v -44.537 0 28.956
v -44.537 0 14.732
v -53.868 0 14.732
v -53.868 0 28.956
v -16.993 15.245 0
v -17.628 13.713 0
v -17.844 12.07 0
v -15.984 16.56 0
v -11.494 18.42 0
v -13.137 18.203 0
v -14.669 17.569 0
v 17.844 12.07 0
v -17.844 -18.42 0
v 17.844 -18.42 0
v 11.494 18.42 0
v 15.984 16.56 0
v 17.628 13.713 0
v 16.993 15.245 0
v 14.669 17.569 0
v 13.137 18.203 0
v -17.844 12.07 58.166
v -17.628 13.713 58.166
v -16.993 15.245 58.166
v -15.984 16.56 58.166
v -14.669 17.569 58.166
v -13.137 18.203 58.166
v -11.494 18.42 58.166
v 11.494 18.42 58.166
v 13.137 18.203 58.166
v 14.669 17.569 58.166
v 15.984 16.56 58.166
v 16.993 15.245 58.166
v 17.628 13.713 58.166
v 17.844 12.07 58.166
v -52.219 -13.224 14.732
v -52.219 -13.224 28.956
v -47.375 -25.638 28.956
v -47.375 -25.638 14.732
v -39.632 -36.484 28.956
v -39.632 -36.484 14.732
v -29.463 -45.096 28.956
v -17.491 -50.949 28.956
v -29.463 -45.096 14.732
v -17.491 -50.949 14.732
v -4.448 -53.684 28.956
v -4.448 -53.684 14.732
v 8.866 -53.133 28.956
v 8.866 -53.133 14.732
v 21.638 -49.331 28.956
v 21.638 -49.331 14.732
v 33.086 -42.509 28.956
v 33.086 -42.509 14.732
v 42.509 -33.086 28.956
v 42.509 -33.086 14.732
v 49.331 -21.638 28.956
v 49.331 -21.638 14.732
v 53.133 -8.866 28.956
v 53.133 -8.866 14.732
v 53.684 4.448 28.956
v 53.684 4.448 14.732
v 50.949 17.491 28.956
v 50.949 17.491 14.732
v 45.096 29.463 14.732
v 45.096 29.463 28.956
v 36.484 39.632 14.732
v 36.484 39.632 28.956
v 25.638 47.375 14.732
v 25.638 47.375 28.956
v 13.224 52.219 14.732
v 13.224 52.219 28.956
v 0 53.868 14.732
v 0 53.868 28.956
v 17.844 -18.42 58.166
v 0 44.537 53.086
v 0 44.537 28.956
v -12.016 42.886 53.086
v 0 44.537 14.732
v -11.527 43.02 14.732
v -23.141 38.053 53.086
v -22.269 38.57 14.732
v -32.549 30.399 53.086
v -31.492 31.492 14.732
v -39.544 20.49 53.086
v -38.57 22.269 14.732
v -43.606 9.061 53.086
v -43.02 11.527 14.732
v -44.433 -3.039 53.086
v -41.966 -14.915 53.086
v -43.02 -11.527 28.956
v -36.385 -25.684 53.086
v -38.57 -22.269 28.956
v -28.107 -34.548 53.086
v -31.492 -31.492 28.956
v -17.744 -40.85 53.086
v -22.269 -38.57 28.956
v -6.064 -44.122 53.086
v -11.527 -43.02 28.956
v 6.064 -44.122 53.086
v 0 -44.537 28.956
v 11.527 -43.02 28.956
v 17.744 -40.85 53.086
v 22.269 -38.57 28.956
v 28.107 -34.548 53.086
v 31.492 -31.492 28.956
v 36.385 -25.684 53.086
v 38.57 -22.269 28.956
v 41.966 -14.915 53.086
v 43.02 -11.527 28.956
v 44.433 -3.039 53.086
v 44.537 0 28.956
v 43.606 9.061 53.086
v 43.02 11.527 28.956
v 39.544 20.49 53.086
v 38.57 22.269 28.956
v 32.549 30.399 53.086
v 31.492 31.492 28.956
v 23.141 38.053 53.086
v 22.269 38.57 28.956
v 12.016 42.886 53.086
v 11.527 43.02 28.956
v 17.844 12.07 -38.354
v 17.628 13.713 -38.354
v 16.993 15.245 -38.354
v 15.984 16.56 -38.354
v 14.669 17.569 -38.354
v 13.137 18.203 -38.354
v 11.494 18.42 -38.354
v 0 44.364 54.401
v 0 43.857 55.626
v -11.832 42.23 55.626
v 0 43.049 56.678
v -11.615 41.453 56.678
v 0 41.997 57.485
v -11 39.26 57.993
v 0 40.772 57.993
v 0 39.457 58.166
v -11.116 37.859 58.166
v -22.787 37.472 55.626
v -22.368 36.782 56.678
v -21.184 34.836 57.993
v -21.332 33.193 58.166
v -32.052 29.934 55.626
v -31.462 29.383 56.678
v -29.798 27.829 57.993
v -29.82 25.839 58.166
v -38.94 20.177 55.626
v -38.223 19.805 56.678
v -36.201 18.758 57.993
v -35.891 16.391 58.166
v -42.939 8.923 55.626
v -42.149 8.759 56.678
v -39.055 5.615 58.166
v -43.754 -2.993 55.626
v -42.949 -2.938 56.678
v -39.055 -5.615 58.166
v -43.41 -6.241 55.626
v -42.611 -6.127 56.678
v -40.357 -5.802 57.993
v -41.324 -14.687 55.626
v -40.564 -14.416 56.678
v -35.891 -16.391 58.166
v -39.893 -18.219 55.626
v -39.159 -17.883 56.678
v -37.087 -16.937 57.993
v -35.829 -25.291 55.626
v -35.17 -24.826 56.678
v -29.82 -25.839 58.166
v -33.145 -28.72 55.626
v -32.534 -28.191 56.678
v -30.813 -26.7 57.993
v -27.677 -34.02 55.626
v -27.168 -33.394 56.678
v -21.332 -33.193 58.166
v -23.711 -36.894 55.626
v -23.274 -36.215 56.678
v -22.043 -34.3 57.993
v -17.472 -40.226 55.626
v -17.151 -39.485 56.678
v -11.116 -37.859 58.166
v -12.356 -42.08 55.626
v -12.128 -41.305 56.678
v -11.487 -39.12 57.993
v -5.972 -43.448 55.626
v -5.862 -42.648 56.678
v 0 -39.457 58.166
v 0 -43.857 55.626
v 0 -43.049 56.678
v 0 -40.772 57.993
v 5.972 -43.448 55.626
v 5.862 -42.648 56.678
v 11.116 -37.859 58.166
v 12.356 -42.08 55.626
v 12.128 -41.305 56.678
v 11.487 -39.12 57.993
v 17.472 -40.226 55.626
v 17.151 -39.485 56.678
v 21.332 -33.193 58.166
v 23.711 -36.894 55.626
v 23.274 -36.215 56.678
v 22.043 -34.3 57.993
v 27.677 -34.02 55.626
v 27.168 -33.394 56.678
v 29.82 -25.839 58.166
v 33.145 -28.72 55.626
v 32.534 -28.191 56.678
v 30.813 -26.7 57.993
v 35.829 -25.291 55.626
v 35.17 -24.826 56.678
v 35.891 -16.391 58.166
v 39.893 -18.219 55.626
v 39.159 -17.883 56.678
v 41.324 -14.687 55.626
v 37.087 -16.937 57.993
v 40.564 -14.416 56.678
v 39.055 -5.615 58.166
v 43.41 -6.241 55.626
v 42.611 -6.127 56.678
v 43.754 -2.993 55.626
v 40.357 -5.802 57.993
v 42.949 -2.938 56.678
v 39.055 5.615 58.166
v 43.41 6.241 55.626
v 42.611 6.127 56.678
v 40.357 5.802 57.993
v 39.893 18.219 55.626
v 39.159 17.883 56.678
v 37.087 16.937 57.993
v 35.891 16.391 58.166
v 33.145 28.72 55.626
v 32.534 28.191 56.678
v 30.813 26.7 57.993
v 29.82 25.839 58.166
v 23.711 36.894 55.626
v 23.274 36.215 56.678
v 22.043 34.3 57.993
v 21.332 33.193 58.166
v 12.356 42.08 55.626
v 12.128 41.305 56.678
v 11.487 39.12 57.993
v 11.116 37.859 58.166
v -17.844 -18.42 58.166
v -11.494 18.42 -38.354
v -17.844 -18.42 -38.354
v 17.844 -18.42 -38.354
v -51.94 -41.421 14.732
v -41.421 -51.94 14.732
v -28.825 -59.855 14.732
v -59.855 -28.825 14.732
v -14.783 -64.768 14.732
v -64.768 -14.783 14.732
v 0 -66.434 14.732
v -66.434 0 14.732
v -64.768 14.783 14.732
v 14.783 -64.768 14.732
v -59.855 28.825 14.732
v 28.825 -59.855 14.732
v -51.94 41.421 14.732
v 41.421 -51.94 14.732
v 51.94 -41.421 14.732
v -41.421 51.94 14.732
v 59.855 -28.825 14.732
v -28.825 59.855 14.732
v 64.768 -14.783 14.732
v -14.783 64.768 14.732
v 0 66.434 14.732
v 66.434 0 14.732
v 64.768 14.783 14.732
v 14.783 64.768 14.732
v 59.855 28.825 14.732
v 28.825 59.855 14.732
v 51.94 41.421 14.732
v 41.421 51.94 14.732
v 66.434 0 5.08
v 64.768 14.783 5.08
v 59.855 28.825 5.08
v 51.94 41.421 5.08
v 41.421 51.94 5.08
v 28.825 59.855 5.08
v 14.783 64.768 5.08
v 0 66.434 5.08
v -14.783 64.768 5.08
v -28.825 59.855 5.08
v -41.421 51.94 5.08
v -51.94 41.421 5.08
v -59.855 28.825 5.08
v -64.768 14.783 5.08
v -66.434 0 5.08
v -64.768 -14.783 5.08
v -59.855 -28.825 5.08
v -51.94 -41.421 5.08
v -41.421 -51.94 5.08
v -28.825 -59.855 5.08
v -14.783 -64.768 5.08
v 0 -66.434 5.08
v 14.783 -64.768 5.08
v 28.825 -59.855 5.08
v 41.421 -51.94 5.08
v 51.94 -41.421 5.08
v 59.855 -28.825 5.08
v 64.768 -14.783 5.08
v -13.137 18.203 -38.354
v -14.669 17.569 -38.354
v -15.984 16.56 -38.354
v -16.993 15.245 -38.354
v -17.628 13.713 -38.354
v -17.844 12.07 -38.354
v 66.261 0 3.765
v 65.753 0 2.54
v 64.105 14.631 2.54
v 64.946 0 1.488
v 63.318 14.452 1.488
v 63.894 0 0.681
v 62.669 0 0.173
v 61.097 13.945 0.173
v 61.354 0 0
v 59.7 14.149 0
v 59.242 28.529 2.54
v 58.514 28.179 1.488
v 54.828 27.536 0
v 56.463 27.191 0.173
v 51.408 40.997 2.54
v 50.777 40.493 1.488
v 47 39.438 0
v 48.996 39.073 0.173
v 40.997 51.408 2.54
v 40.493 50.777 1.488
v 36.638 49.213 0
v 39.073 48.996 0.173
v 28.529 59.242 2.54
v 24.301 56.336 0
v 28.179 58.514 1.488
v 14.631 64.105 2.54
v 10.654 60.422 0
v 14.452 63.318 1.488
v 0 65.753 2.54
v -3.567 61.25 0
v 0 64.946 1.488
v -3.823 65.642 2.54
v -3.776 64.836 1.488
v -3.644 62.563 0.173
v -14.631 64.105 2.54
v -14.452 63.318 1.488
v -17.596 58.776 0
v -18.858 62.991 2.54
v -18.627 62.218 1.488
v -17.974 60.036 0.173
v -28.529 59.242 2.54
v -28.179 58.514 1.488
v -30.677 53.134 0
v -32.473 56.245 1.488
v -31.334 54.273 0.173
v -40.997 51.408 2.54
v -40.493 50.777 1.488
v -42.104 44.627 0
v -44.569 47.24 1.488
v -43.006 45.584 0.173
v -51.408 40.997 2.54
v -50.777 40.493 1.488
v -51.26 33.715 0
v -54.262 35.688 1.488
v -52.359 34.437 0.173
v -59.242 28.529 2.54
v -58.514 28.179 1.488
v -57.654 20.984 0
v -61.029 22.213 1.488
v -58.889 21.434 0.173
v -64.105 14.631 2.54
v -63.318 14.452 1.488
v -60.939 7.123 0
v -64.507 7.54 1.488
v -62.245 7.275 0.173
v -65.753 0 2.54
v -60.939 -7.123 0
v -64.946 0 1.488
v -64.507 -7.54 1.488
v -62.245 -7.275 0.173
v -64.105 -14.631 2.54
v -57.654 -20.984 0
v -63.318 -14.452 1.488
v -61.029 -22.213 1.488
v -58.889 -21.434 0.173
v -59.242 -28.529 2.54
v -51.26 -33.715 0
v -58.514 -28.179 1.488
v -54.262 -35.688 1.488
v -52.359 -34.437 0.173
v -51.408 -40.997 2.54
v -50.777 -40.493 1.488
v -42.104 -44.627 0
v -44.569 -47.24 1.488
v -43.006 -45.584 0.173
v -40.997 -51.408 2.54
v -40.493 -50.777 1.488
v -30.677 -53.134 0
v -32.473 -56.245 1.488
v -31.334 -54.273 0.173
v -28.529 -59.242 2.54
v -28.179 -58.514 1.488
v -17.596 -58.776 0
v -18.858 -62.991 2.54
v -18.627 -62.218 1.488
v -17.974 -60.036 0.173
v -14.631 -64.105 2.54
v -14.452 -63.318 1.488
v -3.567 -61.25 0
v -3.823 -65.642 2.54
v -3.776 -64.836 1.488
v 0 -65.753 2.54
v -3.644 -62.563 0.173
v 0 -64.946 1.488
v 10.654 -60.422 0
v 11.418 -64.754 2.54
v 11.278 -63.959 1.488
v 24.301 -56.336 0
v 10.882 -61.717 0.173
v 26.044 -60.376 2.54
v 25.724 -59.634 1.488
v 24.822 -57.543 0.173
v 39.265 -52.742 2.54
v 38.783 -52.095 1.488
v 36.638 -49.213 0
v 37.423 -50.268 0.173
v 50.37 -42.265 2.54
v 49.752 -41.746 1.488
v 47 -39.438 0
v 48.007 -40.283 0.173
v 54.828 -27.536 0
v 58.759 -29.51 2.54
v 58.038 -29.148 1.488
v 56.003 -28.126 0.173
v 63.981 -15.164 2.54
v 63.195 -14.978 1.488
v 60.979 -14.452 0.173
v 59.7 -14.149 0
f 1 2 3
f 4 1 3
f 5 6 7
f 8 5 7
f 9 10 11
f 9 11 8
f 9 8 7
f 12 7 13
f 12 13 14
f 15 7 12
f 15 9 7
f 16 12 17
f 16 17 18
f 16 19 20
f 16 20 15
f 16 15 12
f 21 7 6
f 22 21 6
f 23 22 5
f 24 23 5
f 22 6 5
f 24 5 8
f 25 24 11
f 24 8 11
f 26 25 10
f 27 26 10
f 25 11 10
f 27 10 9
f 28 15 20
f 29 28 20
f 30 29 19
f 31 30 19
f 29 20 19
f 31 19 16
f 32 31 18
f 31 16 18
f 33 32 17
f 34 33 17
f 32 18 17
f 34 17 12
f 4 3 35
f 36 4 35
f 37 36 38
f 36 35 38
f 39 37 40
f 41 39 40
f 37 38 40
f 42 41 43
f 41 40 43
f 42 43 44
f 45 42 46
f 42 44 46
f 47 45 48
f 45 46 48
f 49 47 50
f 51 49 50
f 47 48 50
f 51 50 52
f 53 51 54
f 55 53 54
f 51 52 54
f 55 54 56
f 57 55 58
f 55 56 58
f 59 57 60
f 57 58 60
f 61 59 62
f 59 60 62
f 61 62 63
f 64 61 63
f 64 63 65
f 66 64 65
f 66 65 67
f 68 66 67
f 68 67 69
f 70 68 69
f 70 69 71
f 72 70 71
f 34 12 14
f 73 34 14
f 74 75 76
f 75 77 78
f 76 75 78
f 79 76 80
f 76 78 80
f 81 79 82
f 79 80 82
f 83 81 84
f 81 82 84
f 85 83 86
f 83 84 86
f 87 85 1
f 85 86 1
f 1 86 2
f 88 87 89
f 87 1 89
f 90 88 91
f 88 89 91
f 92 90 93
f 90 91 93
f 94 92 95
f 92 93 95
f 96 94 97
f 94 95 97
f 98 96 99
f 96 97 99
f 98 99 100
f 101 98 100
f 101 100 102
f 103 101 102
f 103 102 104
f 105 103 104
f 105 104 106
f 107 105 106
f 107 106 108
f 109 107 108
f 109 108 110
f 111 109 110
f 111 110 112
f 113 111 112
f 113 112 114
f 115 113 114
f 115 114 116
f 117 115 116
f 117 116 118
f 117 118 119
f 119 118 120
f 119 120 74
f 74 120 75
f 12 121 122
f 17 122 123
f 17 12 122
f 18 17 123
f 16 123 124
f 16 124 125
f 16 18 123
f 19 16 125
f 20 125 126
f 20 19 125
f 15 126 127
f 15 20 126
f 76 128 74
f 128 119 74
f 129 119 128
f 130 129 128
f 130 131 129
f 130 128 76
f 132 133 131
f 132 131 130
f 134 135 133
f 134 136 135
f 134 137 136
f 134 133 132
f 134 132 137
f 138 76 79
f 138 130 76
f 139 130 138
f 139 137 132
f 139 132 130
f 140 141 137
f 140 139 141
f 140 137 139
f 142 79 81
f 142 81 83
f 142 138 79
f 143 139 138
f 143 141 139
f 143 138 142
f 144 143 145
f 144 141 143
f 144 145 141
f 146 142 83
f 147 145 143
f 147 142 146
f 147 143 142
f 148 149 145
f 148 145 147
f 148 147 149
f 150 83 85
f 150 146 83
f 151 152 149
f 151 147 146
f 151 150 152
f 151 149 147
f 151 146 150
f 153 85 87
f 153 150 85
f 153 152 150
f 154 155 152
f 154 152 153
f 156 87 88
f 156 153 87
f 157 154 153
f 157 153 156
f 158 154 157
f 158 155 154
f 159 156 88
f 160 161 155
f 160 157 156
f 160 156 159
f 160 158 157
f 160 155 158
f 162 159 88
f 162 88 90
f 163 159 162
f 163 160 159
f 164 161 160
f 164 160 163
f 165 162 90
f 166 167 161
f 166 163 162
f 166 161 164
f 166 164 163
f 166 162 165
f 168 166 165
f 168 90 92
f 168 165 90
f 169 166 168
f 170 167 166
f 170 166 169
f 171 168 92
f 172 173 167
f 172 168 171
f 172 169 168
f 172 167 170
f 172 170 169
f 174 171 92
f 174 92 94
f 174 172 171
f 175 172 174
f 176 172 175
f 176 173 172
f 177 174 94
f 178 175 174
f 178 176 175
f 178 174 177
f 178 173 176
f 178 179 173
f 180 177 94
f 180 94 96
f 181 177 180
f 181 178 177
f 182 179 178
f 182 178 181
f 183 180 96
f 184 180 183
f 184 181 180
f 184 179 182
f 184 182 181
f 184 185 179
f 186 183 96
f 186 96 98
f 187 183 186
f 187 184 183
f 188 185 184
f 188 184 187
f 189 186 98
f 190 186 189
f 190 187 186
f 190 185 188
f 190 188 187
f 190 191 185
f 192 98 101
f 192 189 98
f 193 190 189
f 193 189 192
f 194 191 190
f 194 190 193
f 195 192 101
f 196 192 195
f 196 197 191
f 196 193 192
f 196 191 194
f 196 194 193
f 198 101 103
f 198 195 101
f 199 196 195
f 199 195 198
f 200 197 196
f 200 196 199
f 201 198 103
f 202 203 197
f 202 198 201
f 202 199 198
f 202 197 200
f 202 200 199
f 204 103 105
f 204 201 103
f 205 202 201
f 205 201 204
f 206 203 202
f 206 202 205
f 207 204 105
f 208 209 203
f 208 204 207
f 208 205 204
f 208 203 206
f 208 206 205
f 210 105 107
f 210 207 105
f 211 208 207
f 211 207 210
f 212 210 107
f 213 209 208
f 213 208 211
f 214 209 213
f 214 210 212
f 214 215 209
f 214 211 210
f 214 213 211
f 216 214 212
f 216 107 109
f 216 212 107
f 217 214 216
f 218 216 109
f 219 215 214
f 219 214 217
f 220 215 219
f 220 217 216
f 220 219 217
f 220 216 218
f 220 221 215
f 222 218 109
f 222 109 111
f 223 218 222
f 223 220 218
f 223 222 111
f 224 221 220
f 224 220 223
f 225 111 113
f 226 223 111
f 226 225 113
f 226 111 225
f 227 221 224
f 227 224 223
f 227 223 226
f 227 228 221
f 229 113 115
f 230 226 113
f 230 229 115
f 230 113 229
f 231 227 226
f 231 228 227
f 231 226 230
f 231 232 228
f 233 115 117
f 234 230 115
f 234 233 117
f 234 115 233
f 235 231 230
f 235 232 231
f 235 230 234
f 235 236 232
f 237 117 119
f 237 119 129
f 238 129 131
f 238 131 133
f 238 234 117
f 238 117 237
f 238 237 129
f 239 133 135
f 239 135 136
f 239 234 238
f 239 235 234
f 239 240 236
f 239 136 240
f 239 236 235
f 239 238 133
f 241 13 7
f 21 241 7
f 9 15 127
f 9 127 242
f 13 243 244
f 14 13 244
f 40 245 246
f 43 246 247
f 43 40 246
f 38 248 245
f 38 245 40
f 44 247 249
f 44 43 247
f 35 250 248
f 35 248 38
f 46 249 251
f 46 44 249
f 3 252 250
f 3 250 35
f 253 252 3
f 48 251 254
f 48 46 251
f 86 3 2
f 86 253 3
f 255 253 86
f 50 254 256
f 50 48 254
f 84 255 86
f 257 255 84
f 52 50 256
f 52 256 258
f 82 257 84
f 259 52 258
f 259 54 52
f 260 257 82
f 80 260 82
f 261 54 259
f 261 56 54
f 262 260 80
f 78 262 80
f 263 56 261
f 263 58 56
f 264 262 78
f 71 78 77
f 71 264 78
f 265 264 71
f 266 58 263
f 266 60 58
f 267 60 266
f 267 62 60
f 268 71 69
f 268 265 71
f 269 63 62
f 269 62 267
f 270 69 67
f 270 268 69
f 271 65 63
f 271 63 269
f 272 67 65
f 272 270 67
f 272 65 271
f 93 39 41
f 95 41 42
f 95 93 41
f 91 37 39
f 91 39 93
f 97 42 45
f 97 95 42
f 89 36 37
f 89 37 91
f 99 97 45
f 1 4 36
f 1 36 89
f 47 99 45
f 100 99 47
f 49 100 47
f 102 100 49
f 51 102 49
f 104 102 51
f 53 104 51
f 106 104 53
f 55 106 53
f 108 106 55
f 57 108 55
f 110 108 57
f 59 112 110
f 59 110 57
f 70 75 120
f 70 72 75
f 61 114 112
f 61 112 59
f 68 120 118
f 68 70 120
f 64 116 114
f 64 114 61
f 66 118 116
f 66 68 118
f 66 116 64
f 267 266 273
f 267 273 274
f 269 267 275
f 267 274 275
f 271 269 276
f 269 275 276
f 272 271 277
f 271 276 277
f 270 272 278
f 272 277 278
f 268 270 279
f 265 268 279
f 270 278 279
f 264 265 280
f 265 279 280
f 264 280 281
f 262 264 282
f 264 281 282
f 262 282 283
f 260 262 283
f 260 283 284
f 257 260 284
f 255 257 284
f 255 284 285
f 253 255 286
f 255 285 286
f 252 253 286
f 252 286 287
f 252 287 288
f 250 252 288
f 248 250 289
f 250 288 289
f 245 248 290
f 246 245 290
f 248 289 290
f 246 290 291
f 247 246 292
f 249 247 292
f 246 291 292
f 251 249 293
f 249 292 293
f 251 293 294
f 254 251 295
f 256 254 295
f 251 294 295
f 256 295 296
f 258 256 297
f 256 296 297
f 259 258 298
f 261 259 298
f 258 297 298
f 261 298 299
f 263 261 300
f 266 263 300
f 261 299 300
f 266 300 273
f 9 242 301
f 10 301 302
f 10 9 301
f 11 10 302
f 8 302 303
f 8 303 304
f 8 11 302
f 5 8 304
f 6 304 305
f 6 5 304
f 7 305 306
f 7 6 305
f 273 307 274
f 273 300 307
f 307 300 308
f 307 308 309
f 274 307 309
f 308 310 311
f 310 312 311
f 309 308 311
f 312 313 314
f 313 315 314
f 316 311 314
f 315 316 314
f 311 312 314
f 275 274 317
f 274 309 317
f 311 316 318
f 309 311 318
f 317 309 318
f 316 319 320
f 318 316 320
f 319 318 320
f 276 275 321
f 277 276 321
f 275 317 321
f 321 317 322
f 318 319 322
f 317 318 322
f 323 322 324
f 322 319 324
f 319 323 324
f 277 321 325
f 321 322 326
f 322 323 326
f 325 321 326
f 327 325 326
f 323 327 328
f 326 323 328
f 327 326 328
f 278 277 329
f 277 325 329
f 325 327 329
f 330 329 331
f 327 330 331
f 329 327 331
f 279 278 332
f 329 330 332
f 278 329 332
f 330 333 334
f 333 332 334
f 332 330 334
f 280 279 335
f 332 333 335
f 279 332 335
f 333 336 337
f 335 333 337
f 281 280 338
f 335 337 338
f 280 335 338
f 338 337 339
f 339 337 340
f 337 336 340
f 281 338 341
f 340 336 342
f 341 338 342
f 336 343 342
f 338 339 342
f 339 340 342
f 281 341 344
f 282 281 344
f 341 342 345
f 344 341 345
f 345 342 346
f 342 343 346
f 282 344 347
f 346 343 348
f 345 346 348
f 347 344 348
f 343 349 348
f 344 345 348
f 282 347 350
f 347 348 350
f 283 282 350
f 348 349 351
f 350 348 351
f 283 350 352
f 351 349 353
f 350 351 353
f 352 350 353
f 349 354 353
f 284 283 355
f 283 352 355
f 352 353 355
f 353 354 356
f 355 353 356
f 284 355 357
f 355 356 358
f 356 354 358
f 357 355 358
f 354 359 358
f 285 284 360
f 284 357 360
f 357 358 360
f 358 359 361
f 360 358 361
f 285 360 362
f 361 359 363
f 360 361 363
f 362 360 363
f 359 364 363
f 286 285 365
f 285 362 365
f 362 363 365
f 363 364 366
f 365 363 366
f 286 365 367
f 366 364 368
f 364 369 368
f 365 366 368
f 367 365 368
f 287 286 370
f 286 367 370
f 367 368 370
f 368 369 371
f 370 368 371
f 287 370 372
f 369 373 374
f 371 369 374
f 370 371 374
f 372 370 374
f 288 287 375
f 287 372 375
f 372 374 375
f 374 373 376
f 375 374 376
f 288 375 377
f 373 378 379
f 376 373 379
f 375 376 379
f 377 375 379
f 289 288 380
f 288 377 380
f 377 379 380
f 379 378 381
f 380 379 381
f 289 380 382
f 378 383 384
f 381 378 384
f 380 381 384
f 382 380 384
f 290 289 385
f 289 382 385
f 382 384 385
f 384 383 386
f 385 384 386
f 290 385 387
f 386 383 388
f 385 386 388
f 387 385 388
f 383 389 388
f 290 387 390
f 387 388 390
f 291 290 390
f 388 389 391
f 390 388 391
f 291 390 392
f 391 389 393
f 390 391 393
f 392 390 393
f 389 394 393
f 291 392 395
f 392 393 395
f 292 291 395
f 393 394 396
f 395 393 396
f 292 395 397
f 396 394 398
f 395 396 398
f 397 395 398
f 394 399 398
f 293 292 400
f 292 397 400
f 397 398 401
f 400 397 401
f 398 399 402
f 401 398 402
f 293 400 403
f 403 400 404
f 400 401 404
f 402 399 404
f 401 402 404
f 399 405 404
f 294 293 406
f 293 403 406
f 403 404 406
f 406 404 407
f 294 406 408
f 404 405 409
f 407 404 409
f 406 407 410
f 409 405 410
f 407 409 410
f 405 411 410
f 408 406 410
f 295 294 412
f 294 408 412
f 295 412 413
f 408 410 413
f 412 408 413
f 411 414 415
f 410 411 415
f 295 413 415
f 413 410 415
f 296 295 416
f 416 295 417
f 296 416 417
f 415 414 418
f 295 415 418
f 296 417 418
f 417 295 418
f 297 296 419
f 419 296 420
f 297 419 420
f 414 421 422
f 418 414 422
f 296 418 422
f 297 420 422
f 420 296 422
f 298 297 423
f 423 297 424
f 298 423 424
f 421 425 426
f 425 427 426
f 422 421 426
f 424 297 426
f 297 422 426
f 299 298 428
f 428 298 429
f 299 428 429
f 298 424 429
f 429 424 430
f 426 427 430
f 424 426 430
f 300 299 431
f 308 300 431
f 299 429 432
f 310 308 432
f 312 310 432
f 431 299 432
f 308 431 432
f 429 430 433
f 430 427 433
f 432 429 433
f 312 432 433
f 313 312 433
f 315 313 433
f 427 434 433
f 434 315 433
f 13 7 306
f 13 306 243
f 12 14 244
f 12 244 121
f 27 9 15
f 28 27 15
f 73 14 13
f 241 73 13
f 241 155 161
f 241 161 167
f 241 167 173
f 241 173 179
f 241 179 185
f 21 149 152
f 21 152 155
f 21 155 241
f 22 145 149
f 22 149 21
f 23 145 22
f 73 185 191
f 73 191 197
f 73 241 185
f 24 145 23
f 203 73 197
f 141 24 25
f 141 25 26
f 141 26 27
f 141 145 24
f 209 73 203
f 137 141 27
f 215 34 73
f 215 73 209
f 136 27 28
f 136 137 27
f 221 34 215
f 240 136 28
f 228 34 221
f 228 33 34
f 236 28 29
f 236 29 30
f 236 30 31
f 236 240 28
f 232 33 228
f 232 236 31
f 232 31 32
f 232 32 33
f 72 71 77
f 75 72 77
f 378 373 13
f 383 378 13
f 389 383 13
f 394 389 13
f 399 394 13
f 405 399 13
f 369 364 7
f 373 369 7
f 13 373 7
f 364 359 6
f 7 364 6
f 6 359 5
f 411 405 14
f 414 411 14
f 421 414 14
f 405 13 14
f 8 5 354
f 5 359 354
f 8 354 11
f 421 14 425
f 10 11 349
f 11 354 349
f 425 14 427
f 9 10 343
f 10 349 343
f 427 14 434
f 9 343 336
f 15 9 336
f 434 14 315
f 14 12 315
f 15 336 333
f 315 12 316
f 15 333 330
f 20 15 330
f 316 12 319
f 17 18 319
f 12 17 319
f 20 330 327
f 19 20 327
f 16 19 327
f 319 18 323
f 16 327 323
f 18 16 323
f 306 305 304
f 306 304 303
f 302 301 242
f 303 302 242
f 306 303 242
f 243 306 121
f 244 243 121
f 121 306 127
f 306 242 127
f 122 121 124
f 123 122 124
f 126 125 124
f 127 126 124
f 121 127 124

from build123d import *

# Parameters (mm, degrees)
F1_DEPTH = 58.166
F2_DEPTH = 28.956
F0_R     = 66.4339027136
F3_DEPTH = 14.732
F4_DEPTH = 38.354
F5_R     = 5.08
F6_R     = 5.08


with BuildPart() as f1:
    # F0 (on Top) → F1 (new body)
    with BuildSketch(Plane.XY):
        with BuildLine():
            ThreePointArc((-44.5371092992, 0), (0, -44.5371092992), (44.5371092992, 0))
            ThreePointArc((44.5371092992, 0), (31.4924919999, 31.4924919999), (0, 44.5371092992))
            ThreePointArc((0, 44.5371092992), (-31.4924919999, 31.4924919999), (-44.5371092992, 0))
        make_face()
        with BuildLine():
            ThreePointArc((-17.8439579904, 12.0695693582), (-15.9840860509, 16.5596974188), (-11.4939579904, 18.4195693582))
            Line((-11.4939579904, 18.4195693582), (11.4939579904, 18.4195693582))
            ThreePointArc((11.4939579904, 18.4195693582), (15.9840860509, 16.5596974188), (17.8439579904, 12.0695693582))
            Line((17.8439579904, 12.0695693582), (17.8439579904, -18.4195693582))
            Line((17.8439579904, -18.4195693582), (-17.8439579904, -18.4195693582))
            Line((-17.8439579904, -18.4195693582), (-17.8439579904, 12.0695693582))
        make_face(mode=Mode.SUBTRACT)
    extrude(amount=F1_DEPTH)

    # F0 (on Top) → F2 (join)
    with BuildSketch(Plane.XY):
        with BuildLine():
            ThreePointArc((0, 44.5371092992), (31.4924919999, 31.4924919999), (44.5371092992, 0))
            ThreePointArc((44.5371092992, 0), (0, -44.5371092992), (-44.5371092992, 0))
            Line((-44.5371092992, 0), (-53.86768034, 0))
            ThreePointArc((-53.86768034, 0), (38.0902020552, -38.0902020552), (0, 53.86768034))
            Line((0, 53.86768034), (0, 44.5371092992))
        make_face()
    extrude(amount=F2_DEPTH)

    # F0 (on Top) → F3 (join)
    with BuildSketch(Plane.XY):
        Circle(F0_R)
        with BuildLine():
            ThreePointArc((-44.5371092992, 0), (-31.4924919999, 31.4924919999), (0, 44.5371092992))
            Line((0, 44.5371092992), (0, 53.86768034))
            ThreePointArc((0, 53.86768034), (38.0902020552, -38.0902020552), (-53.86768034, 0))
            Line((-53.86768034, 0), (-44.5371092992, 0))
        make_face(mode=Mode.SUBTRACT)
    extrude(amount=F3_DEPTH)

    # F5
    f5_edges = [f1.edges().sort_by_distance(p)[0] for p in [
        (-66.433903, 0, 0),
    ]]
    fillet(f5_edges, radius=F5_R)

    # F6
    f6_edges = [f1.edges().sort_by_distance(p)[0] for p in [
        (-44.537109, 0, 58.166),
    ]]
    fillet(f6_edges, radius=F6_R)


with BuildPart() as f4:
    # F0 (on Top) → F4 (new body)
    with BuildSketch(Plane.XY):
        with BuildLine():
            Line((11.4939579904, 18.4195693582), (-11.4939579904, 18.4195693582))
            ThreePointArc((-11.4939579904, 18.4195693582), (-15.9840860509, 16.5596974188), (-17.8439579904, 12.0695693582))
            Line((-17.8439579904, 12.0695693582), (-17.8439579904, -18.4195693582))
            Line((-17.8439579904, -18.4195693582), (17.8439579904, -18.4195693582))
            Line((17.8439579904, -18.4195693582), (17.8439579904, 12.0695693582))
            ThreePointArc((17.8439579904, 12.0695693582), (15.9840860509, 16.5596974188), (11.4939579904, 18.4195693582))
        make_face()
    extrude(amount=-F4_DEPTH)


solid = Compound([f1.part, f4.part])
